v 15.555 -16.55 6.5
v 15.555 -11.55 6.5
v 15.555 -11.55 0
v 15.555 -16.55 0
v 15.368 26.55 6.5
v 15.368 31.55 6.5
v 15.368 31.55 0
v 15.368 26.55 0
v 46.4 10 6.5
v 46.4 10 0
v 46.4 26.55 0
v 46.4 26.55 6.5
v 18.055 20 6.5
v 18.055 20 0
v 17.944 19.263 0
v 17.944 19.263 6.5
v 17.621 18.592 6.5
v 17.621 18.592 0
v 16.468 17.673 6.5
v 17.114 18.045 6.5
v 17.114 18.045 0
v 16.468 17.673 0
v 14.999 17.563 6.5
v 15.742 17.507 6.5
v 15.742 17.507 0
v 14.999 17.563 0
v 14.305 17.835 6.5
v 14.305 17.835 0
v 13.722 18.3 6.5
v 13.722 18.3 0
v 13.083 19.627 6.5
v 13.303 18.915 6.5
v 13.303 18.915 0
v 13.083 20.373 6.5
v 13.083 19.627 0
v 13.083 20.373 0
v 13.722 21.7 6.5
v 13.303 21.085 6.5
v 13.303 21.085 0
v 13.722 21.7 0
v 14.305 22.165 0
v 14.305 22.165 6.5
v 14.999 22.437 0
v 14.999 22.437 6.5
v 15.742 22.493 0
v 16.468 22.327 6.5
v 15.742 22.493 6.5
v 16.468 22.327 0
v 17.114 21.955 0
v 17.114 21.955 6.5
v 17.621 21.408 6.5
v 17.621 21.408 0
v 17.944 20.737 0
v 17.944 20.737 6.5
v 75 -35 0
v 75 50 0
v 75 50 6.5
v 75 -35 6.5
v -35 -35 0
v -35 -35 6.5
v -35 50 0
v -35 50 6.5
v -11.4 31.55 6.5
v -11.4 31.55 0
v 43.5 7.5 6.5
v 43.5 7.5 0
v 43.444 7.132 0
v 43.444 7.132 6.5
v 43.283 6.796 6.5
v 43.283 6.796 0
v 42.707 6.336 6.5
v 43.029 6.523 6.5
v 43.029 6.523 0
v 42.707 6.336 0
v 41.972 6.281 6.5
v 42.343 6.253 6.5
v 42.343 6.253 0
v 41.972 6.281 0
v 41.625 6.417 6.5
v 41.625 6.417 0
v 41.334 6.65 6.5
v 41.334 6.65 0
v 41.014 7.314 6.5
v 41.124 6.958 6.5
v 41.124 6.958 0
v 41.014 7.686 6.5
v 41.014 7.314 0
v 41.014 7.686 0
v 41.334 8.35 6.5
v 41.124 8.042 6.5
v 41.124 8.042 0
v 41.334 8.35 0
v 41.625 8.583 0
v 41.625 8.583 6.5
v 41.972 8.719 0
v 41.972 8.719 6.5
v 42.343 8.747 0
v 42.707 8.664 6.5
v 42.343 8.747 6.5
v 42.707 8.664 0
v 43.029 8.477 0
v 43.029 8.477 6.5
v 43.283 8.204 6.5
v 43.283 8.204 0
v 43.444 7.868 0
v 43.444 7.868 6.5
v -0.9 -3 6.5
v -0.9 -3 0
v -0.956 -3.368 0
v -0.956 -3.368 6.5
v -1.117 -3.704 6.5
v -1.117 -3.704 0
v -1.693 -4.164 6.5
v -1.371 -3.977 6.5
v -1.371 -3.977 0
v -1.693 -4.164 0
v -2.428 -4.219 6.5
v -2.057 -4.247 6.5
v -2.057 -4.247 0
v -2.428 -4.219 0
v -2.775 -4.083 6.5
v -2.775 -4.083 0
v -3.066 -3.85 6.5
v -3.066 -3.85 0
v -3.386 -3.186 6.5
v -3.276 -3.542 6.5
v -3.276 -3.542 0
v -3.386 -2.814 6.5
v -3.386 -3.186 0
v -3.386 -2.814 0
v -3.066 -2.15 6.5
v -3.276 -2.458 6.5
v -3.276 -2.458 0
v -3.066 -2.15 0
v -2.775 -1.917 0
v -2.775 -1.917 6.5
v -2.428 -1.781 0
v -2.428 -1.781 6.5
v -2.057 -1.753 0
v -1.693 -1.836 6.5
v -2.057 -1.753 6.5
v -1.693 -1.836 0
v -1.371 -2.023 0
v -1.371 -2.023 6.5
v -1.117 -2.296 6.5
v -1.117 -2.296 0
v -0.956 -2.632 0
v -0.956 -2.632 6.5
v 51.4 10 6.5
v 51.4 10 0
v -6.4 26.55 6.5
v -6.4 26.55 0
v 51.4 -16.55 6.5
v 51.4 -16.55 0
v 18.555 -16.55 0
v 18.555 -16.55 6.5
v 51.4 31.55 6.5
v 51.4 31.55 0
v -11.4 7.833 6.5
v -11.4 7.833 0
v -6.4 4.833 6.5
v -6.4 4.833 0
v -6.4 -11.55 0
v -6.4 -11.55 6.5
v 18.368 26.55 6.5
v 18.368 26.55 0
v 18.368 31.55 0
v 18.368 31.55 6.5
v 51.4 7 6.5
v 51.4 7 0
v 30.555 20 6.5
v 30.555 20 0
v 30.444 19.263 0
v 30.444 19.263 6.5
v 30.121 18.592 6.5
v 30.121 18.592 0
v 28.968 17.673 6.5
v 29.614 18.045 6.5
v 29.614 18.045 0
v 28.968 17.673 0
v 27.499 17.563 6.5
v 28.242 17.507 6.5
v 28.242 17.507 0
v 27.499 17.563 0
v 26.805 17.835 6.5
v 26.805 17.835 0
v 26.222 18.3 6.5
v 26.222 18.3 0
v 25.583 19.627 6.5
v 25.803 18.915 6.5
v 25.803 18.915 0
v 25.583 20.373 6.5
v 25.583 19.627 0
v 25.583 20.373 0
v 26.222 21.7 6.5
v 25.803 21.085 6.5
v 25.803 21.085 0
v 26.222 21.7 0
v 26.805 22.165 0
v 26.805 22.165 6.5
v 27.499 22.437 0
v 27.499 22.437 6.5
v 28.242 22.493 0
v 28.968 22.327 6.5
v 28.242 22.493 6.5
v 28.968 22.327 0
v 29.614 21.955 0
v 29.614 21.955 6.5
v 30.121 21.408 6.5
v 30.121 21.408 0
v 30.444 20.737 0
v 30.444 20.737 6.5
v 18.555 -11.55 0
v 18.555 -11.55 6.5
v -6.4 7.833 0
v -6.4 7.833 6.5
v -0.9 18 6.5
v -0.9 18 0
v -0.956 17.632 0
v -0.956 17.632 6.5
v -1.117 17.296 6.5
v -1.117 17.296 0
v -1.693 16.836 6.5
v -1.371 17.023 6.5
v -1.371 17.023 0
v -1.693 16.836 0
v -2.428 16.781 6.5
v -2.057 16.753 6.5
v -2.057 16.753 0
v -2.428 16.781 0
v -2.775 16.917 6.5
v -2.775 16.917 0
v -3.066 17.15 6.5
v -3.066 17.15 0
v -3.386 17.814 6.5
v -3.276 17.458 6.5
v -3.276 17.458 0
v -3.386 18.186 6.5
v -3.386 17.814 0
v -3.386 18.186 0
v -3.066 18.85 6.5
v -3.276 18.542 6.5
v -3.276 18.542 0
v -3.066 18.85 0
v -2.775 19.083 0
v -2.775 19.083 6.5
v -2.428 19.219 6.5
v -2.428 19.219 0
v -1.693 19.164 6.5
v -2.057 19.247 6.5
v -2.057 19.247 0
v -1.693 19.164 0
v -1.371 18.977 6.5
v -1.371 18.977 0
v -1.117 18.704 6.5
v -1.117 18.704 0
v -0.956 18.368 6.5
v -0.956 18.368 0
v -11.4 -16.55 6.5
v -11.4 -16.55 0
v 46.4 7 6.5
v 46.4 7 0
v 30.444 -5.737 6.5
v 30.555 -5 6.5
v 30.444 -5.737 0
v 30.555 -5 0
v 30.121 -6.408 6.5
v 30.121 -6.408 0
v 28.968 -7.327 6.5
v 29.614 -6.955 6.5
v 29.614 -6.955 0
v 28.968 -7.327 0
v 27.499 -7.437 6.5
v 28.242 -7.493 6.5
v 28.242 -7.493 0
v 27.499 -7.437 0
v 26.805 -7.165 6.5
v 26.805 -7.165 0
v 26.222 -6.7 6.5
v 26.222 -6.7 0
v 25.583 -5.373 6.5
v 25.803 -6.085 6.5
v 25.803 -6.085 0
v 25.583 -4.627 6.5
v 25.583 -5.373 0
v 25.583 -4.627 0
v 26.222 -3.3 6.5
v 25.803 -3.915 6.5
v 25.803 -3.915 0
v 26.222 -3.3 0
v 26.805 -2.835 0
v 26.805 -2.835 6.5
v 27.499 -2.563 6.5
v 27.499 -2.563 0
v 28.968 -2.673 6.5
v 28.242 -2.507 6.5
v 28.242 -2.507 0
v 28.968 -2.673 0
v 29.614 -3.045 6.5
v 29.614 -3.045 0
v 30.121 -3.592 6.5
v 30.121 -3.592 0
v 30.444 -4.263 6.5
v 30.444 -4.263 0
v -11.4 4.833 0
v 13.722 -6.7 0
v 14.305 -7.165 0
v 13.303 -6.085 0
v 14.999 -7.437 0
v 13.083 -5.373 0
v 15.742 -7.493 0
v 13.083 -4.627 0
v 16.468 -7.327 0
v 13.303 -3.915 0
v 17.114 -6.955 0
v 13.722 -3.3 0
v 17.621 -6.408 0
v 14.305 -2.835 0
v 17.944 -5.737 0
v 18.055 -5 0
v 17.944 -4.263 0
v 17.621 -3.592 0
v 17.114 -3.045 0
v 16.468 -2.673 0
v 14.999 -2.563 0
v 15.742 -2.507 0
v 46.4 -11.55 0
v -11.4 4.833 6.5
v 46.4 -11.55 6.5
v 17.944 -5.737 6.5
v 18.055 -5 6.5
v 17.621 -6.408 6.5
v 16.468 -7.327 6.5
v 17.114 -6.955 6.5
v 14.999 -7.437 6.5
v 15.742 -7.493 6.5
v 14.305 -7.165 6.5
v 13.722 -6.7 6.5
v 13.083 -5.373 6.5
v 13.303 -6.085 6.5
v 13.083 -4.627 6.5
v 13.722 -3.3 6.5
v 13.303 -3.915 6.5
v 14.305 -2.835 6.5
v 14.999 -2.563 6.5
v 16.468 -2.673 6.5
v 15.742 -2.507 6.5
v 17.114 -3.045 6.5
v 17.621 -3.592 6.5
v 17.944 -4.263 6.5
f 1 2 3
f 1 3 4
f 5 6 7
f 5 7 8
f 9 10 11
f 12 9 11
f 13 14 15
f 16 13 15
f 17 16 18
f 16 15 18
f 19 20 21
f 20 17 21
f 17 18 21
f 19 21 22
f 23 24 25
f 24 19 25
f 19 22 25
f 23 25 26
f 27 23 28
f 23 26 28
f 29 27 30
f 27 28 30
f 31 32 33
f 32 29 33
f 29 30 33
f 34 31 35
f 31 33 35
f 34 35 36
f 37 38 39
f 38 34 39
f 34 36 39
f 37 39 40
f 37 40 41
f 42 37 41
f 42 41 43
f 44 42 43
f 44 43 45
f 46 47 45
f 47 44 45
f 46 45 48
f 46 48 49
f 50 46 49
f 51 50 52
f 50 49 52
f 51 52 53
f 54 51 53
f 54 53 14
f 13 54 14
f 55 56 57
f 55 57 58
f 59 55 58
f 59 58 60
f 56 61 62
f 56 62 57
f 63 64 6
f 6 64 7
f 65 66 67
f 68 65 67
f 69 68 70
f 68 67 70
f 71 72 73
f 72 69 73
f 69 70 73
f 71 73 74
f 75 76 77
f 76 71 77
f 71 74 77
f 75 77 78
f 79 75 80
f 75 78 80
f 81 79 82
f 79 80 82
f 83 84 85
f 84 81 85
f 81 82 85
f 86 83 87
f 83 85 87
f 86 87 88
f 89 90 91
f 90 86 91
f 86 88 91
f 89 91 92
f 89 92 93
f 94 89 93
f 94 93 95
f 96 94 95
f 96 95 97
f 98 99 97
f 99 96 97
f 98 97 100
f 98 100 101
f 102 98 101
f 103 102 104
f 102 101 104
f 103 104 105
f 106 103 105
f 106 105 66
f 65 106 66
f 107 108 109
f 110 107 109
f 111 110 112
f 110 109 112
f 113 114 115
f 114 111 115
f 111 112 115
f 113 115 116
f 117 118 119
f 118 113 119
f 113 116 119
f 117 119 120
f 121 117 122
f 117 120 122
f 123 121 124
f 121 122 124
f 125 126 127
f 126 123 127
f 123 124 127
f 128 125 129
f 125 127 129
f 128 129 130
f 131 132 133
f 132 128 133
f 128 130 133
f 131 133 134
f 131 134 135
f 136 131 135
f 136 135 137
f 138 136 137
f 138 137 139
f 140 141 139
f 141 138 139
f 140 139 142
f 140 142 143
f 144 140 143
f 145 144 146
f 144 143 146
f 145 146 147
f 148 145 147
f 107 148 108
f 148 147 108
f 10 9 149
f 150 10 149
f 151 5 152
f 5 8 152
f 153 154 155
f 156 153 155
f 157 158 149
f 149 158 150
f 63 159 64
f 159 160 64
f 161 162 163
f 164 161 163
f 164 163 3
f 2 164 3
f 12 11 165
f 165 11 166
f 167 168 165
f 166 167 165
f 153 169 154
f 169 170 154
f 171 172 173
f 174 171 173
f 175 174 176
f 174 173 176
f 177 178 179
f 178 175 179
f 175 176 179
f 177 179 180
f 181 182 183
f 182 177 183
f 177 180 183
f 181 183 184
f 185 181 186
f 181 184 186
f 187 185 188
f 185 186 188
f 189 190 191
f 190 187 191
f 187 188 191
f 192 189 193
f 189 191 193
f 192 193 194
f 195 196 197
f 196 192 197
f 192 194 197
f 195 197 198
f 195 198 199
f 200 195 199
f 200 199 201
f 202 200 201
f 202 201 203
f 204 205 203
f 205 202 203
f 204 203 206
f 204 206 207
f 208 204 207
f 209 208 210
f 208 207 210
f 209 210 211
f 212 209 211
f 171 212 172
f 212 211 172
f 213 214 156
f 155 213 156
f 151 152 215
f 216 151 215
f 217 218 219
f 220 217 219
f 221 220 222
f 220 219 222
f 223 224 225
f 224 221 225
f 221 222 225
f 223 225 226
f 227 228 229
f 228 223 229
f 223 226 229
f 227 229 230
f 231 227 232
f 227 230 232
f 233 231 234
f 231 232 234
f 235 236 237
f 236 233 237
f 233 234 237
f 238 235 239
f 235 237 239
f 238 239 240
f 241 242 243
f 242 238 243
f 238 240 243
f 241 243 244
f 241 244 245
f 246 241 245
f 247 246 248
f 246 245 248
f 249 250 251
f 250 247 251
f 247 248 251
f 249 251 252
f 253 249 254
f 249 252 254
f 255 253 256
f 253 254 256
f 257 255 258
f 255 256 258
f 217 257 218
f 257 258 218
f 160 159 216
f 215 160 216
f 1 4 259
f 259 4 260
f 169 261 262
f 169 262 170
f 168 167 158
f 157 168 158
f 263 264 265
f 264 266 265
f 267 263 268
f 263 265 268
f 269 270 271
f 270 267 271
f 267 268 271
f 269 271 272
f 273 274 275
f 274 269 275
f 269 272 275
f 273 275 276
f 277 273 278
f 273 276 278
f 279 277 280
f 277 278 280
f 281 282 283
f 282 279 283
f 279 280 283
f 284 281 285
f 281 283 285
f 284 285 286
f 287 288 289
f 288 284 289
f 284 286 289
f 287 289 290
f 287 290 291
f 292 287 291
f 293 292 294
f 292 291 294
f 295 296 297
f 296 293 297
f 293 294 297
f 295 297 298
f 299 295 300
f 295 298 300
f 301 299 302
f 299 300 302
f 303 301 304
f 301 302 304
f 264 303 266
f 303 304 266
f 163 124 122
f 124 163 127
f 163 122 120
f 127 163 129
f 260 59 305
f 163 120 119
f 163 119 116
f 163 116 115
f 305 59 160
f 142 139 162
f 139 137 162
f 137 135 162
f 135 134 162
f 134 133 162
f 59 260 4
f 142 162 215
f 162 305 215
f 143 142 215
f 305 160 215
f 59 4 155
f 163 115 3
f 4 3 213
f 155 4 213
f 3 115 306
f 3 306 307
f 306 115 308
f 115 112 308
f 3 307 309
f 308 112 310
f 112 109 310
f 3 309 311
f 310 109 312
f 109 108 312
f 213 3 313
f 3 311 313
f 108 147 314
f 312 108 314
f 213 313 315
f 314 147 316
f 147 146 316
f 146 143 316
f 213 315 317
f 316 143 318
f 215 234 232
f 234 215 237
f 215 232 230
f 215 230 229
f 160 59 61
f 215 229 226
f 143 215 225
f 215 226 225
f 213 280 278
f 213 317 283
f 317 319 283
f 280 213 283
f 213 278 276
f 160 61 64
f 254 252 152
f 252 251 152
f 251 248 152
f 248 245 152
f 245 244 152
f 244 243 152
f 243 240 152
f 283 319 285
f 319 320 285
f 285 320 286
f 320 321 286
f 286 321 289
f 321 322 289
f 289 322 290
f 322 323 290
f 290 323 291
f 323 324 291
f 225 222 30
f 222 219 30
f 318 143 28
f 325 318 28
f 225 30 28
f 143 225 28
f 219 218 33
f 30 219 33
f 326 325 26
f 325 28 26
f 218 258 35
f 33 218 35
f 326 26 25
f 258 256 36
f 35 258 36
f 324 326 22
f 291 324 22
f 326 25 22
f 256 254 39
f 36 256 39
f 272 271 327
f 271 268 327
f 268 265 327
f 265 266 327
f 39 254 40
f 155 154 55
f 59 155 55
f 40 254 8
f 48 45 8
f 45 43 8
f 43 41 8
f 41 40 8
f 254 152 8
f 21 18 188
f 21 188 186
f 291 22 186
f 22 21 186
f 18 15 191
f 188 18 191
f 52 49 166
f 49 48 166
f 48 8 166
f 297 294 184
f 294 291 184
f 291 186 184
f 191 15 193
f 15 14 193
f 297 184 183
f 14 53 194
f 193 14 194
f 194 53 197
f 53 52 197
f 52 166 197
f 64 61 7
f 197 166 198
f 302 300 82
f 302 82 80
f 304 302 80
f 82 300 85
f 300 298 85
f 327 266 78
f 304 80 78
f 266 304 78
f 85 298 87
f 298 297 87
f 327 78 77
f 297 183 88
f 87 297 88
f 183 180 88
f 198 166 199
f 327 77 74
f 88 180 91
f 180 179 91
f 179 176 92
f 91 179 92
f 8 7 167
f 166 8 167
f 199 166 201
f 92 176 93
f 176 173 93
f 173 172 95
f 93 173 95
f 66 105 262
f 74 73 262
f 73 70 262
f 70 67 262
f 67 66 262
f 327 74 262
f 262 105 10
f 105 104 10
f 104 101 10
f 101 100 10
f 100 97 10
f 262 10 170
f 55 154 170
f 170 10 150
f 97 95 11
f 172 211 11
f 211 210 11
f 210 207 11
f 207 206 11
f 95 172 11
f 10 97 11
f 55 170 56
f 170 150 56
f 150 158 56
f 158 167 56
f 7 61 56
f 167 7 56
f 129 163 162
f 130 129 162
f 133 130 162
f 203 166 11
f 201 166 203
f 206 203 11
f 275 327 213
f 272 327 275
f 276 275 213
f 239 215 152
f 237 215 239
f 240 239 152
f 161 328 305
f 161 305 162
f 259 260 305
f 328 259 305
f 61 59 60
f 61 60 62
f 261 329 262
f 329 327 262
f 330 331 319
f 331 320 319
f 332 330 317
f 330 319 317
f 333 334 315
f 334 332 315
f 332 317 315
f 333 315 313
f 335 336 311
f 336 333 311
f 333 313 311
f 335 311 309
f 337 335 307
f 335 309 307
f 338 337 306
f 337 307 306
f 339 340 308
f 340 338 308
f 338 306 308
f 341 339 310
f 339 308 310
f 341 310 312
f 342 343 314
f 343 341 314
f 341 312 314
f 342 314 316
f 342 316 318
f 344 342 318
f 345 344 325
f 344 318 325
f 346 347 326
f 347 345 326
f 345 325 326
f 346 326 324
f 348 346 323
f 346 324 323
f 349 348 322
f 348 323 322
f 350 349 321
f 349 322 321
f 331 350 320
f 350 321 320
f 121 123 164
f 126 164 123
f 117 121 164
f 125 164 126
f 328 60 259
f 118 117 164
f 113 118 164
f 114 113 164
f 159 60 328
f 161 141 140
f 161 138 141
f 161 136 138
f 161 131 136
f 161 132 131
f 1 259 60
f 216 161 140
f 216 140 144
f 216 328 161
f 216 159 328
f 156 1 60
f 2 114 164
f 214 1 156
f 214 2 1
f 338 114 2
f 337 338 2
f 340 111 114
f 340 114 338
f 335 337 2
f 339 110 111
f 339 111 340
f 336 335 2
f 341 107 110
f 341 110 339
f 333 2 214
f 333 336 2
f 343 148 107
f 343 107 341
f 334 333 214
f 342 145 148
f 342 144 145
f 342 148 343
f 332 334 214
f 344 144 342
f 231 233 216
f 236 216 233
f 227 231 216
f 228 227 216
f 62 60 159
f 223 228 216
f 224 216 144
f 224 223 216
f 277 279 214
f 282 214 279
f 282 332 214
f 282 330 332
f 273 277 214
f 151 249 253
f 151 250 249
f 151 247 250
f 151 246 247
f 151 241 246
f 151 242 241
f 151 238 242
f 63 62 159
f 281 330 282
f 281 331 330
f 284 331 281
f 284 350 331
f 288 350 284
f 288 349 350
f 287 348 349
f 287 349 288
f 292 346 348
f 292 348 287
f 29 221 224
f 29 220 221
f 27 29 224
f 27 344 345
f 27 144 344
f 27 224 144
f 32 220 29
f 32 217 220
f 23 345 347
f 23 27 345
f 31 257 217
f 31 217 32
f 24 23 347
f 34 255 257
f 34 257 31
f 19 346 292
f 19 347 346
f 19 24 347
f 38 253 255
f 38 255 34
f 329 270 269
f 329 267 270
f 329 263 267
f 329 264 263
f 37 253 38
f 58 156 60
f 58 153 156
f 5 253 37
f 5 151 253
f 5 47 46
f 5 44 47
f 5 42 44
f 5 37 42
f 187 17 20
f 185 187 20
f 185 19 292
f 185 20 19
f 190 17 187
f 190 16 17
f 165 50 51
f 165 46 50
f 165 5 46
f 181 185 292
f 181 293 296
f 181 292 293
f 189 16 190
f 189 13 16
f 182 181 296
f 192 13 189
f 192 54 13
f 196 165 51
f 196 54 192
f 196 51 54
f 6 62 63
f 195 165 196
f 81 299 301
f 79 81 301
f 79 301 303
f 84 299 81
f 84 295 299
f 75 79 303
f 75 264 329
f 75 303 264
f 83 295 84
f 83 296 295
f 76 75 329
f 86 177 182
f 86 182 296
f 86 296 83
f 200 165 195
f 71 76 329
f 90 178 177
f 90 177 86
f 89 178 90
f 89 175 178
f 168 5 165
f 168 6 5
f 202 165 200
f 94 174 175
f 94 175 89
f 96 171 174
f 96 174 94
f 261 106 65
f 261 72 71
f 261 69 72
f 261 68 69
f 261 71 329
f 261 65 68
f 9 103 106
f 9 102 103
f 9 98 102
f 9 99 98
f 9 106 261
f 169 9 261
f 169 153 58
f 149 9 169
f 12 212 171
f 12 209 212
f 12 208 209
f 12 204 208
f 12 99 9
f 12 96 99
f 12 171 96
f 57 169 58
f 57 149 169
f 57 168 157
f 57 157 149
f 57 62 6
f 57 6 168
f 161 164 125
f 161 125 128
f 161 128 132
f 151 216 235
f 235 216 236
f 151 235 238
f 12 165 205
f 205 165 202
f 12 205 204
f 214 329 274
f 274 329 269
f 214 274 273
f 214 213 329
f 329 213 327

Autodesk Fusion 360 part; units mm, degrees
sketch "Esquisse1" plane through (0, 0, 0) normal (0, 0, 1) x (1, 0, 0)
  line L0 (-35, 50) -> (75, 50)
  line L1 (75, 50) -> (75, -35)
  line L2 (75, -35) -> (-35, -35)
  line L3 (-35, -35) -> (-35, 50)
  circle A0 centre (28.055, -5) radius 2.5
  circle A1 centre (-2.15, 18) radius 1.25
  circle A2 centre (15.555, -5) radius 2.5
  circle A3 centre (-2.15, -3) radius 1.25
  circle A4 centre (15.555, 20) radius 2.5
  circle A5 centre (42.25, 7.5) radius 1.25
  circle A6 centre (28.055, 20) radius 2.5
  line L4 (-11.4, 4.8329) -> (-6.4, 4.8329)
  line L5 (-11.4, 7.8329) -> (-6.4, 7.8329)
  line L6 (15.3682, 31.55) -> (15.3682, 26.55)
  line L7 (18.3682, 31.55) -> (18.3682, 26.55)
  line L8 (46.4, 10) -> (51.4, 10)
  line L9 (46.4, 7) -> (51.4, 7)
  line L10 (15.555, -11.55) -> (15.555, -16.55)
  line L11 (18.555, -11.55) -> (18.555, -16.55)
  line L12 (-11.4, 31.55) -> (15.3682, 31.55)
  line L13 (18.3682, 31.55) -> (51.4, 31.55)
  line L14 (46.4, 26.55) -> (18.3682, 26.55)
  line L15 (15.3682, 26.55) -> (-6.4, 26.55)
  line L16 (51.4, 31.55) -> (51.4, 10)
  line L17 (51.4, 7) -> (51.4, -16.55)
  line L18 (46.4, -11.55) -> (46.4, 7)
  line L19 (46.4, 10) -> (46.4, 26.55)
  line L20 (-6.4, -11.55) -> (15.555, -11.55)
  line L21 (18.555, -11.55) -> (46.4, -11.55)
  line L22 (51.4, -16.55) -> (18.555, -16.55)
  line L23 (15.555, -16.55) -> (-11.4, -16.55)
  line L24 (-11.4, -16.55) -> (-11.4, 4.8329)
  line L25 (-11.4, 7.8329) -> (-11.4, 31.55)
  line L26 (-6.4, 26.55) -> (-6.4, 7.8329)
  line L27 (-6.4, 4.8329) -> (-6.4, -11.55)
  point P0 (20, 10)
  dimension "d1" = 110
  dimension "d2" = 85
  dimension "d3" = 2.5
  dimension "d4" = 2.5
  dimension "d5" = 5
  dimension "d6" = 5
  dimension "d7" = 5
  dimension "d8" = 5
  dimension "d9" = 2.5
  dimension "d10" = 38.1
  dimension "d11" = 52.8
  dimension "d12" = 6.55
  dimension "d13" = 6.55
  dimension "d14" = 8.55
  dimension "d15" = 8.55
  dimension "d16" = 6.55
  dimension "d17" = 6.55
  dimension "d18" = 19.05
  dimension "d19" = 4.15
  dimension "d20" = 18.345
  dimension "d21" = 30.845
  dimension "d22" = 4.25
  dimension "d23" = 4.25
  dimension "d24" = 21.955
  dimension "d25" = 18.345
  dimension "d26" = 23.45
  dimension "d27" = 38.1
  dimension "d28" = 52.8
  dimension "d30" = 28.6
  dimension "d35" = 5
  dimension "d36" = 5
  dimension "d37" = 5
  dimension "d38" = 5
  dimension "d39" = 3
  dimension "d40" = 3
  dimension "d41" = 3
  dimension "d42" = 3
extrude "Extrusion3" add sketch "Esquisse1" along normal blind 6.5 contours L0 L1 L2 L3 | A1 | A3 | A5
sketch "Esquisse3" plane through (0, 0, 6.5) normal (0, 0, 1) x (-1, 0, 0)
  circle A0 centre (-15.555, -20) radius 2.5
  circle A1 centre (-28.055, -20) radius 2.5
  line L0 (11.4, -4.8329) -> (6.4, -4.8329)
  line L1 (6.4, -4.8329) -> (6.4, 11.55)
  line L2 (6.4, 11.55) -> (-15.555, 11.55)
  line L3 (-15.555, 11.55) -> (-15.555, 16.55)
  line L4 (-15.555, 16.55) -> (11.4, 16.55)
  line L5 (11.4, 16.55) -> (11.4, -4.8329)
  line L6 (-18.3682, -26.55) -> (-18.3682, -31.55)
  line L7 (-18.3682, -31.55) -> (-51.4, -31.55)
  line L8 (-51.4, -31.55) -> (-51.4, -10)
  line L9 (-51.4, -10) -> (-46.4, -10)
  line L10 (-46.4, -10) -> (-46.4, -26.55)
  line L11 (-46.4, -26.55) -> (-18.3682, -26.55)
  circle A2 centre (-28.055, 5) radius 2.5
  line L12 (-18.555, 16.55) -> (-18.555, 11.55)
  line L13 (-18.555, 11.55) -> (-46.4, 11.55)
  line L14 (-46.4, 11.55) -> (-46.4, -7)
  line L15 (-46.4, -7) -> (-51.4, -7)
  line L16 (-51.4, -7) -> (-51.4, 16.55)
  line L17 (-51.4, 16.55) -> (-18.555, 16.55)
  line L18 (6.4, -7.8329) -> (11.4, -7.8329)
  line L19 (11.4, -7.8329) -> (11.4, -31.55)
  line L20 (11.4, -31.55) -> (-15.3682, -31.55)
  line L21 (-15.3682, -31.55) -> (-15.3682, -26.55)
  line L22 (-15.3682, -26.55) -> (6.4, -26.55)
  line L23 (6.4, -26.55) -> (6.4, -7.8329)
  circle A3 centre (-15.555, 5) radius 2.5
  line L24 (35, 35) -> (-75, 35)
  line L25 (-75, 35) -> (-75, -50)
  line L26 (-75, -50) -> (35, -50)
  line L27 (35, -50) -> (35, 35)
  line L28 (6.4, 35) -> (6.4, -50) construction
extrude "Extrusion4" cut sketch "Esquisse1" along normal blind 6.5 contours A1 | A3 | A5
